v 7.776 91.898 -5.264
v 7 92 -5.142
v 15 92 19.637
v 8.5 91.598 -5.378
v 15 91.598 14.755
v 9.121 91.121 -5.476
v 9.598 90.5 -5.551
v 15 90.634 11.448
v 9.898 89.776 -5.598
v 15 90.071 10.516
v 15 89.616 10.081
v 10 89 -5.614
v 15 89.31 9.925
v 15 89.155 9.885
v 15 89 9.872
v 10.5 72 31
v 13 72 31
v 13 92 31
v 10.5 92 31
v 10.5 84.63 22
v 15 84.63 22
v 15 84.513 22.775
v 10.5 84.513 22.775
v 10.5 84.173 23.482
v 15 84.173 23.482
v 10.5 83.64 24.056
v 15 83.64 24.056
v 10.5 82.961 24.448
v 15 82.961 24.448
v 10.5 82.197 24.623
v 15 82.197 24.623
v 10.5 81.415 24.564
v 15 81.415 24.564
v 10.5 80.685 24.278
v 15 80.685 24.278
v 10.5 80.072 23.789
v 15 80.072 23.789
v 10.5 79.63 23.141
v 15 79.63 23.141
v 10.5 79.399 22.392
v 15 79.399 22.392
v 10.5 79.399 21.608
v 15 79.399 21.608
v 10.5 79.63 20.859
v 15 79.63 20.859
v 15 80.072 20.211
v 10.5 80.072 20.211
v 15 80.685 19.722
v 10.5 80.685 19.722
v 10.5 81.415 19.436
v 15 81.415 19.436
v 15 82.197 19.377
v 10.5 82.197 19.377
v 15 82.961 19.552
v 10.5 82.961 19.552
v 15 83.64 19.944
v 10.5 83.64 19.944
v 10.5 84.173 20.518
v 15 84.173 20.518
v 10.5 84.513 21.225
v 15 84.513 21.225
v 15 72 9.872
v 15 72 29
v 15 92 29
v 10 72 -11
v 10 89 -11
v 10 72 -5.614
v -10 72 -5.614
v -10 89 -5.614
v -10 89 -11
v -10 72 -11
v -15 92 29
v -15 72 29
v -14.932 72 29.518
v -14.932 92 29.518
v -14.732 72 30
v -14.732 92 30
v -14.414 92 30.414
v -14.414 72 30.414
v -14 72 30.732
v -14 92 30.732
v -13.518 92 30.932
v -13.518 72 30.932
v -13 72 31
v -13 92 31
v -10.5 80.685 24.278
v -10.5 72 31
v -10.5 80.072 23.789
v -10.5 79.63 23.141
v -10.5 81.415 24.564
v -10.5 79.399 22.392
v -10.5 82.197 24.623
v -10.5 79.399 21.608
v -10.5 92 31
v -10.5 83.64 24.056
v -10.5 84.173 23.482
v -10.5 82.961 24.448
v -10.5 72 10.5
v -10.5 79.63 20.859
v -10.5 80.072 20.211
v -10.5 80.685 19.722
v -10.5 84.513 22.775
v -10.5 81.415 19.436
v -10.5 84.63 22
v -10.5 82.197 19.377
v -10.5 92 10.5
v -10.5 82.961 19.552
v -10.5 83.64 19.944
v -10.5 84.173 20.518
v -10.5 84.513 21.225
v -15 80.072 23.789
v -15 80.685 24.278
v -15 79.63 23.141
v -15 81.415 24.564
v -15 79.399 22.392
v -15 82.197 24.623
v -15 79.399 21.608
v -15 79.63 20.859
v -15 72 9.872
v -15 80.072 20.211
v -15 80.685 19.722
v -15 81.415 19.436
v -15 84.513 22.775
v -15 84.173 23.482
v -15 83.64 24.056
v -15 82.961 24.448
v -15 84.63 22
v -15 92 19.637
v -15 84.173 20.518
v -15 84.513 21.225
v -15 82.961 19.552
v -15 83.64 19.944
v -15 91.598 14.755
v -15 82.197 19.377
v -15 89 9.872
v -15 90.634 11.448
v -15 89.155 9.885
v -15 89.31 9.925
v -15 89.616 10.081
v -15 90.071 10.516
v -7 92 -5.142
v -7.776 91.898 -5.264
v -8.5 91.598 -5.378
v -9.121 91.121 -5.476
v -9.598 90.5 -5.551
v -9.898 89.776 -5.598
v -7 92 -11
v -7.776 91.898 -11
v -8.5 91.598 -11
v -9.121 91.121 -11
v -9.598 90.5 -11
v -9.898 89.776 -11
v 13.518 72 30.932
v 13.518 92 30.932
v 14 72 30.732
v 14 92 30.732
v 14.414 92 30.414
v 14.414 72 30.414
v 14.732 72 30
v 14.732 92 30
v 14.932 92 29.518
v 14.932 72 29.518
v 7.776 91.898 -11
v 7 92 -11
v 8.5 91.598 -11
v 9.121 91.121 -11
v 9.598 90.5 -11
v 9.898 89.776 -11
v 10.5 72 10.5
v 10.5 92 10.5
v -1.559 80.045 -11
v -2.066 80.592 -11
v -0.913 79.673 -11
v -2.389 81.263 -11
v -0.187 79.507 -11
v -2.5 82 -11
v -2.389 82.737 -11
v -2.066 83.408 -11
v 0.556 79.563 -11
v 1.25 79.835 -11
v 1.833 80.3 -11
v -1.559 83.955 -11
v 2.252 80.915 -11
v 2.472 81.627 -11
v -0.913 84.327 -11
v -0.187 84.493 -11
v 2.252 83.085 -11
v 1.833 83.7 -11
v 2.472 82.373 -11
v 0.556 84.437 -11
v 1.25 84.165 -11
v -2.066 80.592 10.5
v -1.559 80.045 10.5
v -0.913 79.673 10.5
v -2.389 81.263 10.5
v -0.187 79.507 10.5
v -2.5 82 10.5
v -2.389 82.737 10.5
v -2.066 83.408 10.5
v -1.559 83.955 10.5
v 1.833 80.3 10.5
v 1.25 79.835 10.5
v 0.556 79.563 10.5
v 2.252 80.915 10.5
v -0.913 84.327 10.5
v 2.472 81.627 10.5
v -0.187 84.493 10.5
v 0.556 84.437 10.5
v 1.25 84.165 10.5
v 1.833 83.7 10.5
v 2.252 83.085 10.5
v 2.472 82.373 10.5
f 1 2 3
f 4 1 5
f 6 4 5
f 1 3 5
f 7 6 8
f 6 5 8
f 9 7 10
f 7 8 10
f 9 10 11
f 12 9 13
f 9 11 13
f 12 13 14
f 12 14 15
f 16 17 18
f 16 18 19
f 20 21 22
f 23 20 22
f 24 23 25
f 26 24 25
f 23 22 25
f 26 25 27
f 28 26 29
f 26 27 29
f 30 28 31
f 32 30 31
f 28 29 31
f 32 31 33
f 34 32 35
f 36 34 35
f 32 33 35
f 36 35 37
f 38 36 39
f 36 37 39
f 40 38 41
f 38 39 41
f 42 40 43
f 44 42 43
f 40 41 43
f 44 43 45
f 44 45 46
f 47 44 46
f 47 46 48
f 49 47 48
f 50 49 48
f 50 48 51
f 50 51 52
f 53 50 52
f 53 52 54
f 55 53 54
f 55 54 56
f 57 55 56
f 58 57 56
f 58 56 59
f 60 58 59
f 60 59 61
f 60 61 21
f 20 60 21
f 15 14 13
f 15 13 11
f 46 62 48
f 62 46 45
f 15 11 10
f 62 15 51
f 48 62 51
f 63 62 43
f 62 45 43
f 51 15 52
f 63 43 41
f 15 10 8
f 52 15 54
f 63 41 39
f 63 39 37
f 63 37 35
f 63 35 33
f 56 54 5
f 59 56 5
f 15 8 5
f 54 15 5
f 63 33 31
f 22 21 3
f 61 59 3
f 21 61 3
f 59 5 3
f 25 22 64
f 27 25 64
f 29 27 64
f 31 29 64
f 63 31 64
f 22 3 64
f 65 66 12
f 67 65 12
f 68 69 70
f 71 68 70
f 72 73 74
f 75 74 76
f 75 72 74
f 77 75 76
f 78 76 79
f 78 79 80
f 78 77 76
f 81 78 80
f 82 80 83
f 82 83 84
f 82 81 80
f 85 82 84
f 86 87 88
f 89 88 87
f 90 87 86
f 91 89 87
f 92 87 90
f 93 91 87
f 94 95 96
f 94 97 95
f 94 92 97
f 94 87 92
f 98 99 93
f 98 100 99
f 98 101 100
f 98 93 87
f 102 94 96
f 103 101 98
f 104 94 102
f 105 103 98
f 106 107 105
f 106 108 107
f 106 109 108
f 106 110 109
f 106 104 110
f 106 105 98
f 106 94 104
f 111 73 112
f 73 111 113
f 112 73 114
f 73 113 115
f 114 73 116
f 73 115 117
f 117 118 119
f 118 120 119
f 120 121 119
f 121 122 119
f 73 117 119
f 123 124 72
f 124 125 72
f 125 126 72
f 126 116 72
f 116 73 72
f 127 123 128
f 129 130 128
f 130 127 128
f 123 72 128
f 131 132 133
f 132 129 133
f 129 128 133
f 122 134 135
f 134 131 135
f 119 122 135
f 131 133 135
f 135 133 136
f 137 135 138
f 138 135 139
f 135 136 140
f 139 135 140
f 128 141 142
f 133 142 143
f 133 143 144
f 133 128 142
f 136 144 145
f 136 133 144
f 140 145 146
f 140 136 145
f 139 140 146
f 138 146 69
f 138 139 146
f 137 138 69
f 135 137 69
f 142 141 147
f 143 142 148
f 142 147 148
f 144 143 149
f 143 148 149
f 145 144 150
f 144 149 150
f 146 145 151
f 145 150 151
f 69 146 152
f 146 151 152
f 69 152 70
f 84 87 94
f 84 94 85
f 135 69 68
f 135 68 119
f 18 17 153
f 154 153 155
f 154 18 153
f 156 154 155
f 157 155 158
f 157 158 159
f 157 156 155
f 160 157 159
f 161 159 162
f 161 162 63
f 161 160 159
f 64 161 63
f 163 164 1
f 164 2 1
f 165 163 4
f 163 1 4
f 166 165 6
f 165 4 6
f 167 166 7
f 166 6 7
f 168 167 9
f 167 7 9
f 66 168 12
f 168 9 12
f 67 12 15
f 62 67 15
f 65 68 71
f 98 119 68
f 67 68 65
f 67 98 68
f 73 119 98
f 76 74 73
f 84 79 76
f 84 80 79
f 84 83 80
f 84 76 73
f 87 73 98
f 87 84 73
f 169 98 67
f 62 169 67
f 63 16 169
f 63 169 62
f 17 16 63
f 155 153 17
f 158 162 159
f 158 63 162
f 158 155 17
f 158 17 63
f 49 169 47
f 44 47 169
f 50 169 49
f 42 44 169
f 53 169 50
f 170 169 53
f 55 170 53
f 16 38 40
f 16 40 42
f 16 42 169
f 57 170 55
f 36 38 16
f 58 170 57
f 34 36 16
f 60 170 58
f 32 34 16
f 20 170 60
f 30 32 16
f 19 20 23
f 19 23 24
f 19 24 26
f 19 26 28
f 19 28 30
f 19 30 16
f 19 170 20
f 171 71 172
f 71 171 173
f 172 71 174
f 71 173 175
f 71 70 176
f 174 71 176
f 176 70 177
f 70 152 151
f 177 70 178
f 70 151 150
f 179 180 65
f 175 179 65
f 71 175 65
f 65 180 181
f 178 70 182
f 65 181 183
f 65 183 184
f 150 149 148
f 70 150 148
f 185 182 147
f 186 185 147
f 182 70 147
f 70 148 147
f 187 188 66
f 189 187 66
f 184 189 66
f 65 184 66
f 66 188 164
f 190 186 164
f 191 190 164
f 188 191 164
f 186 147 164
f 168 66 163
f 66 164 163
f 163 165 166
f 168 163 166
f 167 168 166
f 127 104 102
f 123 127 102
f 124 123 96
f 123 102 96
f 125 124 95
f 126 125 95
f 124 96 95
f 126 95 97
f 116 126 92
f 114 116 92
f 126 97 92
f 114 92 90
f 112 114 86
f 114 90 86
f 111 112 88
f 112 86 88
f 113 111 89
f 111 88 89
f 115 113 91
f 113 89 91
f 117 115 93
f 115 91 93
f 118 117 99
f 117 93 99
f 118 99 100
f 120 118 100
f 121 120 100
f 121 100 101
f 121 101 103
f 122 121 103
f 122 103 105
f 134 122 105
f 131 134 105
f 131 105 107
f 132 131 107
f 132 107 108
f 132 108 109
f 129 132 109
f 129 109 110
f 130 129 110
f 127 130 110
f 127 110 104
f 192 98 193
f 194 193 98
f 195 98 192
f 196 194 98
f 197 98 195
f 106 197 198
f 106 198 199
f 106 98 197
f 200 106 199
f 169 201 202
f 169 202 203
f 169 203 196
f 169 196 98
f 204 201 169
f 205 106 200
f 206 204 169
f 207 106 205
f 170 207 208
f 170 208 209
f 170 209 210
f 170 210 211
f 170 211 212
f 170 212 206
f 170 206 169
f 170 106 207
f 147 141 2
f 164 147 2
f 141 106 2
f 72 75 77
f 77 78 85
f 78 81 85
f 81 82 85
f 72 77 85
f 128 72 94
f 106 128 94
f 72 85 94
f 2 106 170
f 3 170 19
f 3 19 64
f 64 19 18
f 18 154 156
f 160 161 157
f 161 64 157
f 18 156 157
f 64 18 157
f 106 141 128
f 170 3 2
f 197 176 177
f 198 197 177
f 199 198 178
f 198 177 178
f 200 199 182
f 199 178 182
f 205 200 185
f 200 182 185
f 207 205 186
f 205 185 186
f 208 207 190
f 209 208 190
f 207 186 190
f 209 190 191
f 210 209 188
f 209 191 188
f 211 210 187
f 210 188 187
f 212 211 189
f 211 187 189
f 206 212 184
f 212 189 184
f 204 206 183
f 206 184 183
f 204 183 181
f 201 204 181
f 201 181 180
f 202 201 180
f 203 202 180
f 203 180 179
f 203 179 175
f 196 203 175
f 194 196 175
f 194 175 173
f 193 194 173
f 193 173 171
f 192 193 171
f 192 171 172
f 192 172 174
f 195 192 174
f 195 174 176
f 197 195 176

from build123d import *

# Parameters (mm, degrees)
PAD030_DEPTH         = 20
SKETCH094_R          = 2.5
POCKET048_DEPTH      = 42.001
POCKET048_DEPTH_BACK = 0.001
SKETCH095_R          = 2.63
POCKET049_DEPTH      = 30.001
POCKET049_DEPTH_BACK = 0.001
FILLET_R             = 3


with BuildPart() as part:
    # Sketch090 → Pad030 (new body)
    with BuildSketch(Plane(origin=(0, 92, 0), x_dir=(-1, 0, 0), z_dir=(0, 1, 0))):
        with BuildLine():
            Line((-13, 31), (-10.5, 31))
            Line((-10.5, 10.5), (-10.5, 31))
            Line((10.5, 10.5), (-10.5, 10.5))
            Line((10.5, 31), (10.5, 10.5))
            Line((10.5, 31), (13, 31))
            ThreePointArc((15, 29), (14.414214, 30.414214), (13, 31))
            Line((15, 29), (15, 9.872425))
            Line((10, -5.614149), (15, 9.872425))
            Line((10, -5.614149), (10, -11))
            Line((10, -11), (-10, -11))
            Line((-10, -11), (-10, -5.614149))
            Line((-10, -5.614149), (-15, 9.872425))
            Line((-15, 9.872425), (-15, 29))
            ThreePointArc((-13, 31), (-14.414214, 30.414214), (-15, 29))
        make_face()
    extrude(amount=-PAD030_DEPTH)

    # Sketch094 → Pocket048 (cut, two sides)
    with BuildSketch(Plane(origin=(0, 0, -11), x_dir=(-1, 0, 0), z_dir=(0, 0, -1))) as pocket048_sk:
        with Locations((0, 82)):
            Circle(SKETCH094_R)
    extrude(amount=-POCKET048_DEPTH, mode=Mode.SUBTRACT)
    extrude(pocket048_sk.sketch, amount=POCKET048_DEPTH_BACK, mode=Mode.SUBTRACT)

    # Sketch095 → Pocket049 (cut, two sides)
    with BuildSketch(Plane(origin=(15, 82, 0), x_dir=(0, 1, 0), z_dir=(1, 0, 0))) as pocket049_sk:
        with Locations((0, 22)):
            Circle(SKETCH095_R)
    extrude(amount=-POCKET049_DEPTH, mode=Mode.SUBTRACT)
    extrude(pocket049_sk.sketch, amount=POCKET049_DEPTH_BACK, mode=Mode.SUBTRACT)

    # Fillet
    fillet_edges = [part.edges().sort_by_distance(p)[0] for p in [
        (-12.5, 92, 2.129138),
        (-10, 92, -8.307075),
        (10, 92, -8.307075),
        (12.5, 92, 2.129138),
    ]]
    fillet(fillet_edges, radius=FILLET_R)


solid = part.part
